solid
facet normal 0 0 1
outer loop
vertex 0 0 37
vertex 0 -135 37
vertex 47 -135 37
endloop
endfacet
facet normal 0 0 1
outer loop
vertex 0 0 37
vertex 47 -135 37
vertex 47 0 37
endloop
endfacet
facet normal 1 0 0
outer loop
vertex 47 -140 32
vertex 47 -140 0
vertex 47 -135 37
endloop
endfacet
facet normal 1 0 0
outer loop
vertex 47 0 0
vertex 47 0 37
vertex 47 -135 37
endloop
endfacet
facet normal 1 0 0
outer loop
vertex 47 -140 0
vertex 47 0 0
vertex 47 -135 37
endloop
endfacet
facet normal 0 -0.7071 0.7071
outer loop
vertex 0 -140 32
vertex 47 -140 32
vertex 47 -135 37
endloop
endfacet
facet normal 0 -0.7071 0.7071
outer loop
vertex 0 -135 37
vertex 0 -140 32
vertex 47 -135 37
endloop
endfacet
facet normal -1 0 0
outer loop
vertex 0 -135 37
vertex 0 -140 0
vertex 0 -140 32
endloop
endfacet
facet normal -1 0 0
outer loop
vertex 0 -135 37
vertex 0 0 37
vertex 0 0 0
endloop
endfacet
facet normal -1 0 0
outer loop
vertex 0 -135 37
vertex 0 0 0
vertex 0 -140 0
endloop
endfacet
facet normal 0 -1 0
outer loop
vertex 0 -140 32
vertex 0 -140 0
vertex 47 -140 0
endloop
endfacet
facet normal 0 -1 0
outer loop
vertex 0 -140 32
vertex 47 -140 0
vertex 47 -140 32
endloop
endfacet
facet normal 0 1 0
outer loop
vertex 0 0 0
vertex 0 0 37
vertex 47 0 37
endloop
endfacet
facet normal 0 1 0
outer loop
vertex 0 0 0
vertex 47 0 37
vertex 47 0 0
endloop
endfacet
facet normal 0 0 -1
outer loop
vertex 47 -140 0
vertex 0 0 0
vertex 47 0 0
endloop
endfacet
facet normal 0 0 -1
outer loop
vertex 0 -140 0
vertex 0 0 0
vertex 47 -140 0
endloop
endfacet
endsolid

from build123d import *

# Parameters (mm, degrees)
BOSS_EXTRUDE1_DEPTH = 47


with BuildPart() as part:
    # Sketch1 → Boss-Extrude1 (new body)
    with BuildSketch(Plane(origin=(0, 0, 0), x_dir=(0, -1, 0), z_dir=(-1, 0, 0))):
        Polygon((140, 0), (140, 32), (135, 37), (0, 37), (0, 0), align=None)
    extrude(amount=-BOSS_EXTRUDE1_DEPTH)


solid = part.part
